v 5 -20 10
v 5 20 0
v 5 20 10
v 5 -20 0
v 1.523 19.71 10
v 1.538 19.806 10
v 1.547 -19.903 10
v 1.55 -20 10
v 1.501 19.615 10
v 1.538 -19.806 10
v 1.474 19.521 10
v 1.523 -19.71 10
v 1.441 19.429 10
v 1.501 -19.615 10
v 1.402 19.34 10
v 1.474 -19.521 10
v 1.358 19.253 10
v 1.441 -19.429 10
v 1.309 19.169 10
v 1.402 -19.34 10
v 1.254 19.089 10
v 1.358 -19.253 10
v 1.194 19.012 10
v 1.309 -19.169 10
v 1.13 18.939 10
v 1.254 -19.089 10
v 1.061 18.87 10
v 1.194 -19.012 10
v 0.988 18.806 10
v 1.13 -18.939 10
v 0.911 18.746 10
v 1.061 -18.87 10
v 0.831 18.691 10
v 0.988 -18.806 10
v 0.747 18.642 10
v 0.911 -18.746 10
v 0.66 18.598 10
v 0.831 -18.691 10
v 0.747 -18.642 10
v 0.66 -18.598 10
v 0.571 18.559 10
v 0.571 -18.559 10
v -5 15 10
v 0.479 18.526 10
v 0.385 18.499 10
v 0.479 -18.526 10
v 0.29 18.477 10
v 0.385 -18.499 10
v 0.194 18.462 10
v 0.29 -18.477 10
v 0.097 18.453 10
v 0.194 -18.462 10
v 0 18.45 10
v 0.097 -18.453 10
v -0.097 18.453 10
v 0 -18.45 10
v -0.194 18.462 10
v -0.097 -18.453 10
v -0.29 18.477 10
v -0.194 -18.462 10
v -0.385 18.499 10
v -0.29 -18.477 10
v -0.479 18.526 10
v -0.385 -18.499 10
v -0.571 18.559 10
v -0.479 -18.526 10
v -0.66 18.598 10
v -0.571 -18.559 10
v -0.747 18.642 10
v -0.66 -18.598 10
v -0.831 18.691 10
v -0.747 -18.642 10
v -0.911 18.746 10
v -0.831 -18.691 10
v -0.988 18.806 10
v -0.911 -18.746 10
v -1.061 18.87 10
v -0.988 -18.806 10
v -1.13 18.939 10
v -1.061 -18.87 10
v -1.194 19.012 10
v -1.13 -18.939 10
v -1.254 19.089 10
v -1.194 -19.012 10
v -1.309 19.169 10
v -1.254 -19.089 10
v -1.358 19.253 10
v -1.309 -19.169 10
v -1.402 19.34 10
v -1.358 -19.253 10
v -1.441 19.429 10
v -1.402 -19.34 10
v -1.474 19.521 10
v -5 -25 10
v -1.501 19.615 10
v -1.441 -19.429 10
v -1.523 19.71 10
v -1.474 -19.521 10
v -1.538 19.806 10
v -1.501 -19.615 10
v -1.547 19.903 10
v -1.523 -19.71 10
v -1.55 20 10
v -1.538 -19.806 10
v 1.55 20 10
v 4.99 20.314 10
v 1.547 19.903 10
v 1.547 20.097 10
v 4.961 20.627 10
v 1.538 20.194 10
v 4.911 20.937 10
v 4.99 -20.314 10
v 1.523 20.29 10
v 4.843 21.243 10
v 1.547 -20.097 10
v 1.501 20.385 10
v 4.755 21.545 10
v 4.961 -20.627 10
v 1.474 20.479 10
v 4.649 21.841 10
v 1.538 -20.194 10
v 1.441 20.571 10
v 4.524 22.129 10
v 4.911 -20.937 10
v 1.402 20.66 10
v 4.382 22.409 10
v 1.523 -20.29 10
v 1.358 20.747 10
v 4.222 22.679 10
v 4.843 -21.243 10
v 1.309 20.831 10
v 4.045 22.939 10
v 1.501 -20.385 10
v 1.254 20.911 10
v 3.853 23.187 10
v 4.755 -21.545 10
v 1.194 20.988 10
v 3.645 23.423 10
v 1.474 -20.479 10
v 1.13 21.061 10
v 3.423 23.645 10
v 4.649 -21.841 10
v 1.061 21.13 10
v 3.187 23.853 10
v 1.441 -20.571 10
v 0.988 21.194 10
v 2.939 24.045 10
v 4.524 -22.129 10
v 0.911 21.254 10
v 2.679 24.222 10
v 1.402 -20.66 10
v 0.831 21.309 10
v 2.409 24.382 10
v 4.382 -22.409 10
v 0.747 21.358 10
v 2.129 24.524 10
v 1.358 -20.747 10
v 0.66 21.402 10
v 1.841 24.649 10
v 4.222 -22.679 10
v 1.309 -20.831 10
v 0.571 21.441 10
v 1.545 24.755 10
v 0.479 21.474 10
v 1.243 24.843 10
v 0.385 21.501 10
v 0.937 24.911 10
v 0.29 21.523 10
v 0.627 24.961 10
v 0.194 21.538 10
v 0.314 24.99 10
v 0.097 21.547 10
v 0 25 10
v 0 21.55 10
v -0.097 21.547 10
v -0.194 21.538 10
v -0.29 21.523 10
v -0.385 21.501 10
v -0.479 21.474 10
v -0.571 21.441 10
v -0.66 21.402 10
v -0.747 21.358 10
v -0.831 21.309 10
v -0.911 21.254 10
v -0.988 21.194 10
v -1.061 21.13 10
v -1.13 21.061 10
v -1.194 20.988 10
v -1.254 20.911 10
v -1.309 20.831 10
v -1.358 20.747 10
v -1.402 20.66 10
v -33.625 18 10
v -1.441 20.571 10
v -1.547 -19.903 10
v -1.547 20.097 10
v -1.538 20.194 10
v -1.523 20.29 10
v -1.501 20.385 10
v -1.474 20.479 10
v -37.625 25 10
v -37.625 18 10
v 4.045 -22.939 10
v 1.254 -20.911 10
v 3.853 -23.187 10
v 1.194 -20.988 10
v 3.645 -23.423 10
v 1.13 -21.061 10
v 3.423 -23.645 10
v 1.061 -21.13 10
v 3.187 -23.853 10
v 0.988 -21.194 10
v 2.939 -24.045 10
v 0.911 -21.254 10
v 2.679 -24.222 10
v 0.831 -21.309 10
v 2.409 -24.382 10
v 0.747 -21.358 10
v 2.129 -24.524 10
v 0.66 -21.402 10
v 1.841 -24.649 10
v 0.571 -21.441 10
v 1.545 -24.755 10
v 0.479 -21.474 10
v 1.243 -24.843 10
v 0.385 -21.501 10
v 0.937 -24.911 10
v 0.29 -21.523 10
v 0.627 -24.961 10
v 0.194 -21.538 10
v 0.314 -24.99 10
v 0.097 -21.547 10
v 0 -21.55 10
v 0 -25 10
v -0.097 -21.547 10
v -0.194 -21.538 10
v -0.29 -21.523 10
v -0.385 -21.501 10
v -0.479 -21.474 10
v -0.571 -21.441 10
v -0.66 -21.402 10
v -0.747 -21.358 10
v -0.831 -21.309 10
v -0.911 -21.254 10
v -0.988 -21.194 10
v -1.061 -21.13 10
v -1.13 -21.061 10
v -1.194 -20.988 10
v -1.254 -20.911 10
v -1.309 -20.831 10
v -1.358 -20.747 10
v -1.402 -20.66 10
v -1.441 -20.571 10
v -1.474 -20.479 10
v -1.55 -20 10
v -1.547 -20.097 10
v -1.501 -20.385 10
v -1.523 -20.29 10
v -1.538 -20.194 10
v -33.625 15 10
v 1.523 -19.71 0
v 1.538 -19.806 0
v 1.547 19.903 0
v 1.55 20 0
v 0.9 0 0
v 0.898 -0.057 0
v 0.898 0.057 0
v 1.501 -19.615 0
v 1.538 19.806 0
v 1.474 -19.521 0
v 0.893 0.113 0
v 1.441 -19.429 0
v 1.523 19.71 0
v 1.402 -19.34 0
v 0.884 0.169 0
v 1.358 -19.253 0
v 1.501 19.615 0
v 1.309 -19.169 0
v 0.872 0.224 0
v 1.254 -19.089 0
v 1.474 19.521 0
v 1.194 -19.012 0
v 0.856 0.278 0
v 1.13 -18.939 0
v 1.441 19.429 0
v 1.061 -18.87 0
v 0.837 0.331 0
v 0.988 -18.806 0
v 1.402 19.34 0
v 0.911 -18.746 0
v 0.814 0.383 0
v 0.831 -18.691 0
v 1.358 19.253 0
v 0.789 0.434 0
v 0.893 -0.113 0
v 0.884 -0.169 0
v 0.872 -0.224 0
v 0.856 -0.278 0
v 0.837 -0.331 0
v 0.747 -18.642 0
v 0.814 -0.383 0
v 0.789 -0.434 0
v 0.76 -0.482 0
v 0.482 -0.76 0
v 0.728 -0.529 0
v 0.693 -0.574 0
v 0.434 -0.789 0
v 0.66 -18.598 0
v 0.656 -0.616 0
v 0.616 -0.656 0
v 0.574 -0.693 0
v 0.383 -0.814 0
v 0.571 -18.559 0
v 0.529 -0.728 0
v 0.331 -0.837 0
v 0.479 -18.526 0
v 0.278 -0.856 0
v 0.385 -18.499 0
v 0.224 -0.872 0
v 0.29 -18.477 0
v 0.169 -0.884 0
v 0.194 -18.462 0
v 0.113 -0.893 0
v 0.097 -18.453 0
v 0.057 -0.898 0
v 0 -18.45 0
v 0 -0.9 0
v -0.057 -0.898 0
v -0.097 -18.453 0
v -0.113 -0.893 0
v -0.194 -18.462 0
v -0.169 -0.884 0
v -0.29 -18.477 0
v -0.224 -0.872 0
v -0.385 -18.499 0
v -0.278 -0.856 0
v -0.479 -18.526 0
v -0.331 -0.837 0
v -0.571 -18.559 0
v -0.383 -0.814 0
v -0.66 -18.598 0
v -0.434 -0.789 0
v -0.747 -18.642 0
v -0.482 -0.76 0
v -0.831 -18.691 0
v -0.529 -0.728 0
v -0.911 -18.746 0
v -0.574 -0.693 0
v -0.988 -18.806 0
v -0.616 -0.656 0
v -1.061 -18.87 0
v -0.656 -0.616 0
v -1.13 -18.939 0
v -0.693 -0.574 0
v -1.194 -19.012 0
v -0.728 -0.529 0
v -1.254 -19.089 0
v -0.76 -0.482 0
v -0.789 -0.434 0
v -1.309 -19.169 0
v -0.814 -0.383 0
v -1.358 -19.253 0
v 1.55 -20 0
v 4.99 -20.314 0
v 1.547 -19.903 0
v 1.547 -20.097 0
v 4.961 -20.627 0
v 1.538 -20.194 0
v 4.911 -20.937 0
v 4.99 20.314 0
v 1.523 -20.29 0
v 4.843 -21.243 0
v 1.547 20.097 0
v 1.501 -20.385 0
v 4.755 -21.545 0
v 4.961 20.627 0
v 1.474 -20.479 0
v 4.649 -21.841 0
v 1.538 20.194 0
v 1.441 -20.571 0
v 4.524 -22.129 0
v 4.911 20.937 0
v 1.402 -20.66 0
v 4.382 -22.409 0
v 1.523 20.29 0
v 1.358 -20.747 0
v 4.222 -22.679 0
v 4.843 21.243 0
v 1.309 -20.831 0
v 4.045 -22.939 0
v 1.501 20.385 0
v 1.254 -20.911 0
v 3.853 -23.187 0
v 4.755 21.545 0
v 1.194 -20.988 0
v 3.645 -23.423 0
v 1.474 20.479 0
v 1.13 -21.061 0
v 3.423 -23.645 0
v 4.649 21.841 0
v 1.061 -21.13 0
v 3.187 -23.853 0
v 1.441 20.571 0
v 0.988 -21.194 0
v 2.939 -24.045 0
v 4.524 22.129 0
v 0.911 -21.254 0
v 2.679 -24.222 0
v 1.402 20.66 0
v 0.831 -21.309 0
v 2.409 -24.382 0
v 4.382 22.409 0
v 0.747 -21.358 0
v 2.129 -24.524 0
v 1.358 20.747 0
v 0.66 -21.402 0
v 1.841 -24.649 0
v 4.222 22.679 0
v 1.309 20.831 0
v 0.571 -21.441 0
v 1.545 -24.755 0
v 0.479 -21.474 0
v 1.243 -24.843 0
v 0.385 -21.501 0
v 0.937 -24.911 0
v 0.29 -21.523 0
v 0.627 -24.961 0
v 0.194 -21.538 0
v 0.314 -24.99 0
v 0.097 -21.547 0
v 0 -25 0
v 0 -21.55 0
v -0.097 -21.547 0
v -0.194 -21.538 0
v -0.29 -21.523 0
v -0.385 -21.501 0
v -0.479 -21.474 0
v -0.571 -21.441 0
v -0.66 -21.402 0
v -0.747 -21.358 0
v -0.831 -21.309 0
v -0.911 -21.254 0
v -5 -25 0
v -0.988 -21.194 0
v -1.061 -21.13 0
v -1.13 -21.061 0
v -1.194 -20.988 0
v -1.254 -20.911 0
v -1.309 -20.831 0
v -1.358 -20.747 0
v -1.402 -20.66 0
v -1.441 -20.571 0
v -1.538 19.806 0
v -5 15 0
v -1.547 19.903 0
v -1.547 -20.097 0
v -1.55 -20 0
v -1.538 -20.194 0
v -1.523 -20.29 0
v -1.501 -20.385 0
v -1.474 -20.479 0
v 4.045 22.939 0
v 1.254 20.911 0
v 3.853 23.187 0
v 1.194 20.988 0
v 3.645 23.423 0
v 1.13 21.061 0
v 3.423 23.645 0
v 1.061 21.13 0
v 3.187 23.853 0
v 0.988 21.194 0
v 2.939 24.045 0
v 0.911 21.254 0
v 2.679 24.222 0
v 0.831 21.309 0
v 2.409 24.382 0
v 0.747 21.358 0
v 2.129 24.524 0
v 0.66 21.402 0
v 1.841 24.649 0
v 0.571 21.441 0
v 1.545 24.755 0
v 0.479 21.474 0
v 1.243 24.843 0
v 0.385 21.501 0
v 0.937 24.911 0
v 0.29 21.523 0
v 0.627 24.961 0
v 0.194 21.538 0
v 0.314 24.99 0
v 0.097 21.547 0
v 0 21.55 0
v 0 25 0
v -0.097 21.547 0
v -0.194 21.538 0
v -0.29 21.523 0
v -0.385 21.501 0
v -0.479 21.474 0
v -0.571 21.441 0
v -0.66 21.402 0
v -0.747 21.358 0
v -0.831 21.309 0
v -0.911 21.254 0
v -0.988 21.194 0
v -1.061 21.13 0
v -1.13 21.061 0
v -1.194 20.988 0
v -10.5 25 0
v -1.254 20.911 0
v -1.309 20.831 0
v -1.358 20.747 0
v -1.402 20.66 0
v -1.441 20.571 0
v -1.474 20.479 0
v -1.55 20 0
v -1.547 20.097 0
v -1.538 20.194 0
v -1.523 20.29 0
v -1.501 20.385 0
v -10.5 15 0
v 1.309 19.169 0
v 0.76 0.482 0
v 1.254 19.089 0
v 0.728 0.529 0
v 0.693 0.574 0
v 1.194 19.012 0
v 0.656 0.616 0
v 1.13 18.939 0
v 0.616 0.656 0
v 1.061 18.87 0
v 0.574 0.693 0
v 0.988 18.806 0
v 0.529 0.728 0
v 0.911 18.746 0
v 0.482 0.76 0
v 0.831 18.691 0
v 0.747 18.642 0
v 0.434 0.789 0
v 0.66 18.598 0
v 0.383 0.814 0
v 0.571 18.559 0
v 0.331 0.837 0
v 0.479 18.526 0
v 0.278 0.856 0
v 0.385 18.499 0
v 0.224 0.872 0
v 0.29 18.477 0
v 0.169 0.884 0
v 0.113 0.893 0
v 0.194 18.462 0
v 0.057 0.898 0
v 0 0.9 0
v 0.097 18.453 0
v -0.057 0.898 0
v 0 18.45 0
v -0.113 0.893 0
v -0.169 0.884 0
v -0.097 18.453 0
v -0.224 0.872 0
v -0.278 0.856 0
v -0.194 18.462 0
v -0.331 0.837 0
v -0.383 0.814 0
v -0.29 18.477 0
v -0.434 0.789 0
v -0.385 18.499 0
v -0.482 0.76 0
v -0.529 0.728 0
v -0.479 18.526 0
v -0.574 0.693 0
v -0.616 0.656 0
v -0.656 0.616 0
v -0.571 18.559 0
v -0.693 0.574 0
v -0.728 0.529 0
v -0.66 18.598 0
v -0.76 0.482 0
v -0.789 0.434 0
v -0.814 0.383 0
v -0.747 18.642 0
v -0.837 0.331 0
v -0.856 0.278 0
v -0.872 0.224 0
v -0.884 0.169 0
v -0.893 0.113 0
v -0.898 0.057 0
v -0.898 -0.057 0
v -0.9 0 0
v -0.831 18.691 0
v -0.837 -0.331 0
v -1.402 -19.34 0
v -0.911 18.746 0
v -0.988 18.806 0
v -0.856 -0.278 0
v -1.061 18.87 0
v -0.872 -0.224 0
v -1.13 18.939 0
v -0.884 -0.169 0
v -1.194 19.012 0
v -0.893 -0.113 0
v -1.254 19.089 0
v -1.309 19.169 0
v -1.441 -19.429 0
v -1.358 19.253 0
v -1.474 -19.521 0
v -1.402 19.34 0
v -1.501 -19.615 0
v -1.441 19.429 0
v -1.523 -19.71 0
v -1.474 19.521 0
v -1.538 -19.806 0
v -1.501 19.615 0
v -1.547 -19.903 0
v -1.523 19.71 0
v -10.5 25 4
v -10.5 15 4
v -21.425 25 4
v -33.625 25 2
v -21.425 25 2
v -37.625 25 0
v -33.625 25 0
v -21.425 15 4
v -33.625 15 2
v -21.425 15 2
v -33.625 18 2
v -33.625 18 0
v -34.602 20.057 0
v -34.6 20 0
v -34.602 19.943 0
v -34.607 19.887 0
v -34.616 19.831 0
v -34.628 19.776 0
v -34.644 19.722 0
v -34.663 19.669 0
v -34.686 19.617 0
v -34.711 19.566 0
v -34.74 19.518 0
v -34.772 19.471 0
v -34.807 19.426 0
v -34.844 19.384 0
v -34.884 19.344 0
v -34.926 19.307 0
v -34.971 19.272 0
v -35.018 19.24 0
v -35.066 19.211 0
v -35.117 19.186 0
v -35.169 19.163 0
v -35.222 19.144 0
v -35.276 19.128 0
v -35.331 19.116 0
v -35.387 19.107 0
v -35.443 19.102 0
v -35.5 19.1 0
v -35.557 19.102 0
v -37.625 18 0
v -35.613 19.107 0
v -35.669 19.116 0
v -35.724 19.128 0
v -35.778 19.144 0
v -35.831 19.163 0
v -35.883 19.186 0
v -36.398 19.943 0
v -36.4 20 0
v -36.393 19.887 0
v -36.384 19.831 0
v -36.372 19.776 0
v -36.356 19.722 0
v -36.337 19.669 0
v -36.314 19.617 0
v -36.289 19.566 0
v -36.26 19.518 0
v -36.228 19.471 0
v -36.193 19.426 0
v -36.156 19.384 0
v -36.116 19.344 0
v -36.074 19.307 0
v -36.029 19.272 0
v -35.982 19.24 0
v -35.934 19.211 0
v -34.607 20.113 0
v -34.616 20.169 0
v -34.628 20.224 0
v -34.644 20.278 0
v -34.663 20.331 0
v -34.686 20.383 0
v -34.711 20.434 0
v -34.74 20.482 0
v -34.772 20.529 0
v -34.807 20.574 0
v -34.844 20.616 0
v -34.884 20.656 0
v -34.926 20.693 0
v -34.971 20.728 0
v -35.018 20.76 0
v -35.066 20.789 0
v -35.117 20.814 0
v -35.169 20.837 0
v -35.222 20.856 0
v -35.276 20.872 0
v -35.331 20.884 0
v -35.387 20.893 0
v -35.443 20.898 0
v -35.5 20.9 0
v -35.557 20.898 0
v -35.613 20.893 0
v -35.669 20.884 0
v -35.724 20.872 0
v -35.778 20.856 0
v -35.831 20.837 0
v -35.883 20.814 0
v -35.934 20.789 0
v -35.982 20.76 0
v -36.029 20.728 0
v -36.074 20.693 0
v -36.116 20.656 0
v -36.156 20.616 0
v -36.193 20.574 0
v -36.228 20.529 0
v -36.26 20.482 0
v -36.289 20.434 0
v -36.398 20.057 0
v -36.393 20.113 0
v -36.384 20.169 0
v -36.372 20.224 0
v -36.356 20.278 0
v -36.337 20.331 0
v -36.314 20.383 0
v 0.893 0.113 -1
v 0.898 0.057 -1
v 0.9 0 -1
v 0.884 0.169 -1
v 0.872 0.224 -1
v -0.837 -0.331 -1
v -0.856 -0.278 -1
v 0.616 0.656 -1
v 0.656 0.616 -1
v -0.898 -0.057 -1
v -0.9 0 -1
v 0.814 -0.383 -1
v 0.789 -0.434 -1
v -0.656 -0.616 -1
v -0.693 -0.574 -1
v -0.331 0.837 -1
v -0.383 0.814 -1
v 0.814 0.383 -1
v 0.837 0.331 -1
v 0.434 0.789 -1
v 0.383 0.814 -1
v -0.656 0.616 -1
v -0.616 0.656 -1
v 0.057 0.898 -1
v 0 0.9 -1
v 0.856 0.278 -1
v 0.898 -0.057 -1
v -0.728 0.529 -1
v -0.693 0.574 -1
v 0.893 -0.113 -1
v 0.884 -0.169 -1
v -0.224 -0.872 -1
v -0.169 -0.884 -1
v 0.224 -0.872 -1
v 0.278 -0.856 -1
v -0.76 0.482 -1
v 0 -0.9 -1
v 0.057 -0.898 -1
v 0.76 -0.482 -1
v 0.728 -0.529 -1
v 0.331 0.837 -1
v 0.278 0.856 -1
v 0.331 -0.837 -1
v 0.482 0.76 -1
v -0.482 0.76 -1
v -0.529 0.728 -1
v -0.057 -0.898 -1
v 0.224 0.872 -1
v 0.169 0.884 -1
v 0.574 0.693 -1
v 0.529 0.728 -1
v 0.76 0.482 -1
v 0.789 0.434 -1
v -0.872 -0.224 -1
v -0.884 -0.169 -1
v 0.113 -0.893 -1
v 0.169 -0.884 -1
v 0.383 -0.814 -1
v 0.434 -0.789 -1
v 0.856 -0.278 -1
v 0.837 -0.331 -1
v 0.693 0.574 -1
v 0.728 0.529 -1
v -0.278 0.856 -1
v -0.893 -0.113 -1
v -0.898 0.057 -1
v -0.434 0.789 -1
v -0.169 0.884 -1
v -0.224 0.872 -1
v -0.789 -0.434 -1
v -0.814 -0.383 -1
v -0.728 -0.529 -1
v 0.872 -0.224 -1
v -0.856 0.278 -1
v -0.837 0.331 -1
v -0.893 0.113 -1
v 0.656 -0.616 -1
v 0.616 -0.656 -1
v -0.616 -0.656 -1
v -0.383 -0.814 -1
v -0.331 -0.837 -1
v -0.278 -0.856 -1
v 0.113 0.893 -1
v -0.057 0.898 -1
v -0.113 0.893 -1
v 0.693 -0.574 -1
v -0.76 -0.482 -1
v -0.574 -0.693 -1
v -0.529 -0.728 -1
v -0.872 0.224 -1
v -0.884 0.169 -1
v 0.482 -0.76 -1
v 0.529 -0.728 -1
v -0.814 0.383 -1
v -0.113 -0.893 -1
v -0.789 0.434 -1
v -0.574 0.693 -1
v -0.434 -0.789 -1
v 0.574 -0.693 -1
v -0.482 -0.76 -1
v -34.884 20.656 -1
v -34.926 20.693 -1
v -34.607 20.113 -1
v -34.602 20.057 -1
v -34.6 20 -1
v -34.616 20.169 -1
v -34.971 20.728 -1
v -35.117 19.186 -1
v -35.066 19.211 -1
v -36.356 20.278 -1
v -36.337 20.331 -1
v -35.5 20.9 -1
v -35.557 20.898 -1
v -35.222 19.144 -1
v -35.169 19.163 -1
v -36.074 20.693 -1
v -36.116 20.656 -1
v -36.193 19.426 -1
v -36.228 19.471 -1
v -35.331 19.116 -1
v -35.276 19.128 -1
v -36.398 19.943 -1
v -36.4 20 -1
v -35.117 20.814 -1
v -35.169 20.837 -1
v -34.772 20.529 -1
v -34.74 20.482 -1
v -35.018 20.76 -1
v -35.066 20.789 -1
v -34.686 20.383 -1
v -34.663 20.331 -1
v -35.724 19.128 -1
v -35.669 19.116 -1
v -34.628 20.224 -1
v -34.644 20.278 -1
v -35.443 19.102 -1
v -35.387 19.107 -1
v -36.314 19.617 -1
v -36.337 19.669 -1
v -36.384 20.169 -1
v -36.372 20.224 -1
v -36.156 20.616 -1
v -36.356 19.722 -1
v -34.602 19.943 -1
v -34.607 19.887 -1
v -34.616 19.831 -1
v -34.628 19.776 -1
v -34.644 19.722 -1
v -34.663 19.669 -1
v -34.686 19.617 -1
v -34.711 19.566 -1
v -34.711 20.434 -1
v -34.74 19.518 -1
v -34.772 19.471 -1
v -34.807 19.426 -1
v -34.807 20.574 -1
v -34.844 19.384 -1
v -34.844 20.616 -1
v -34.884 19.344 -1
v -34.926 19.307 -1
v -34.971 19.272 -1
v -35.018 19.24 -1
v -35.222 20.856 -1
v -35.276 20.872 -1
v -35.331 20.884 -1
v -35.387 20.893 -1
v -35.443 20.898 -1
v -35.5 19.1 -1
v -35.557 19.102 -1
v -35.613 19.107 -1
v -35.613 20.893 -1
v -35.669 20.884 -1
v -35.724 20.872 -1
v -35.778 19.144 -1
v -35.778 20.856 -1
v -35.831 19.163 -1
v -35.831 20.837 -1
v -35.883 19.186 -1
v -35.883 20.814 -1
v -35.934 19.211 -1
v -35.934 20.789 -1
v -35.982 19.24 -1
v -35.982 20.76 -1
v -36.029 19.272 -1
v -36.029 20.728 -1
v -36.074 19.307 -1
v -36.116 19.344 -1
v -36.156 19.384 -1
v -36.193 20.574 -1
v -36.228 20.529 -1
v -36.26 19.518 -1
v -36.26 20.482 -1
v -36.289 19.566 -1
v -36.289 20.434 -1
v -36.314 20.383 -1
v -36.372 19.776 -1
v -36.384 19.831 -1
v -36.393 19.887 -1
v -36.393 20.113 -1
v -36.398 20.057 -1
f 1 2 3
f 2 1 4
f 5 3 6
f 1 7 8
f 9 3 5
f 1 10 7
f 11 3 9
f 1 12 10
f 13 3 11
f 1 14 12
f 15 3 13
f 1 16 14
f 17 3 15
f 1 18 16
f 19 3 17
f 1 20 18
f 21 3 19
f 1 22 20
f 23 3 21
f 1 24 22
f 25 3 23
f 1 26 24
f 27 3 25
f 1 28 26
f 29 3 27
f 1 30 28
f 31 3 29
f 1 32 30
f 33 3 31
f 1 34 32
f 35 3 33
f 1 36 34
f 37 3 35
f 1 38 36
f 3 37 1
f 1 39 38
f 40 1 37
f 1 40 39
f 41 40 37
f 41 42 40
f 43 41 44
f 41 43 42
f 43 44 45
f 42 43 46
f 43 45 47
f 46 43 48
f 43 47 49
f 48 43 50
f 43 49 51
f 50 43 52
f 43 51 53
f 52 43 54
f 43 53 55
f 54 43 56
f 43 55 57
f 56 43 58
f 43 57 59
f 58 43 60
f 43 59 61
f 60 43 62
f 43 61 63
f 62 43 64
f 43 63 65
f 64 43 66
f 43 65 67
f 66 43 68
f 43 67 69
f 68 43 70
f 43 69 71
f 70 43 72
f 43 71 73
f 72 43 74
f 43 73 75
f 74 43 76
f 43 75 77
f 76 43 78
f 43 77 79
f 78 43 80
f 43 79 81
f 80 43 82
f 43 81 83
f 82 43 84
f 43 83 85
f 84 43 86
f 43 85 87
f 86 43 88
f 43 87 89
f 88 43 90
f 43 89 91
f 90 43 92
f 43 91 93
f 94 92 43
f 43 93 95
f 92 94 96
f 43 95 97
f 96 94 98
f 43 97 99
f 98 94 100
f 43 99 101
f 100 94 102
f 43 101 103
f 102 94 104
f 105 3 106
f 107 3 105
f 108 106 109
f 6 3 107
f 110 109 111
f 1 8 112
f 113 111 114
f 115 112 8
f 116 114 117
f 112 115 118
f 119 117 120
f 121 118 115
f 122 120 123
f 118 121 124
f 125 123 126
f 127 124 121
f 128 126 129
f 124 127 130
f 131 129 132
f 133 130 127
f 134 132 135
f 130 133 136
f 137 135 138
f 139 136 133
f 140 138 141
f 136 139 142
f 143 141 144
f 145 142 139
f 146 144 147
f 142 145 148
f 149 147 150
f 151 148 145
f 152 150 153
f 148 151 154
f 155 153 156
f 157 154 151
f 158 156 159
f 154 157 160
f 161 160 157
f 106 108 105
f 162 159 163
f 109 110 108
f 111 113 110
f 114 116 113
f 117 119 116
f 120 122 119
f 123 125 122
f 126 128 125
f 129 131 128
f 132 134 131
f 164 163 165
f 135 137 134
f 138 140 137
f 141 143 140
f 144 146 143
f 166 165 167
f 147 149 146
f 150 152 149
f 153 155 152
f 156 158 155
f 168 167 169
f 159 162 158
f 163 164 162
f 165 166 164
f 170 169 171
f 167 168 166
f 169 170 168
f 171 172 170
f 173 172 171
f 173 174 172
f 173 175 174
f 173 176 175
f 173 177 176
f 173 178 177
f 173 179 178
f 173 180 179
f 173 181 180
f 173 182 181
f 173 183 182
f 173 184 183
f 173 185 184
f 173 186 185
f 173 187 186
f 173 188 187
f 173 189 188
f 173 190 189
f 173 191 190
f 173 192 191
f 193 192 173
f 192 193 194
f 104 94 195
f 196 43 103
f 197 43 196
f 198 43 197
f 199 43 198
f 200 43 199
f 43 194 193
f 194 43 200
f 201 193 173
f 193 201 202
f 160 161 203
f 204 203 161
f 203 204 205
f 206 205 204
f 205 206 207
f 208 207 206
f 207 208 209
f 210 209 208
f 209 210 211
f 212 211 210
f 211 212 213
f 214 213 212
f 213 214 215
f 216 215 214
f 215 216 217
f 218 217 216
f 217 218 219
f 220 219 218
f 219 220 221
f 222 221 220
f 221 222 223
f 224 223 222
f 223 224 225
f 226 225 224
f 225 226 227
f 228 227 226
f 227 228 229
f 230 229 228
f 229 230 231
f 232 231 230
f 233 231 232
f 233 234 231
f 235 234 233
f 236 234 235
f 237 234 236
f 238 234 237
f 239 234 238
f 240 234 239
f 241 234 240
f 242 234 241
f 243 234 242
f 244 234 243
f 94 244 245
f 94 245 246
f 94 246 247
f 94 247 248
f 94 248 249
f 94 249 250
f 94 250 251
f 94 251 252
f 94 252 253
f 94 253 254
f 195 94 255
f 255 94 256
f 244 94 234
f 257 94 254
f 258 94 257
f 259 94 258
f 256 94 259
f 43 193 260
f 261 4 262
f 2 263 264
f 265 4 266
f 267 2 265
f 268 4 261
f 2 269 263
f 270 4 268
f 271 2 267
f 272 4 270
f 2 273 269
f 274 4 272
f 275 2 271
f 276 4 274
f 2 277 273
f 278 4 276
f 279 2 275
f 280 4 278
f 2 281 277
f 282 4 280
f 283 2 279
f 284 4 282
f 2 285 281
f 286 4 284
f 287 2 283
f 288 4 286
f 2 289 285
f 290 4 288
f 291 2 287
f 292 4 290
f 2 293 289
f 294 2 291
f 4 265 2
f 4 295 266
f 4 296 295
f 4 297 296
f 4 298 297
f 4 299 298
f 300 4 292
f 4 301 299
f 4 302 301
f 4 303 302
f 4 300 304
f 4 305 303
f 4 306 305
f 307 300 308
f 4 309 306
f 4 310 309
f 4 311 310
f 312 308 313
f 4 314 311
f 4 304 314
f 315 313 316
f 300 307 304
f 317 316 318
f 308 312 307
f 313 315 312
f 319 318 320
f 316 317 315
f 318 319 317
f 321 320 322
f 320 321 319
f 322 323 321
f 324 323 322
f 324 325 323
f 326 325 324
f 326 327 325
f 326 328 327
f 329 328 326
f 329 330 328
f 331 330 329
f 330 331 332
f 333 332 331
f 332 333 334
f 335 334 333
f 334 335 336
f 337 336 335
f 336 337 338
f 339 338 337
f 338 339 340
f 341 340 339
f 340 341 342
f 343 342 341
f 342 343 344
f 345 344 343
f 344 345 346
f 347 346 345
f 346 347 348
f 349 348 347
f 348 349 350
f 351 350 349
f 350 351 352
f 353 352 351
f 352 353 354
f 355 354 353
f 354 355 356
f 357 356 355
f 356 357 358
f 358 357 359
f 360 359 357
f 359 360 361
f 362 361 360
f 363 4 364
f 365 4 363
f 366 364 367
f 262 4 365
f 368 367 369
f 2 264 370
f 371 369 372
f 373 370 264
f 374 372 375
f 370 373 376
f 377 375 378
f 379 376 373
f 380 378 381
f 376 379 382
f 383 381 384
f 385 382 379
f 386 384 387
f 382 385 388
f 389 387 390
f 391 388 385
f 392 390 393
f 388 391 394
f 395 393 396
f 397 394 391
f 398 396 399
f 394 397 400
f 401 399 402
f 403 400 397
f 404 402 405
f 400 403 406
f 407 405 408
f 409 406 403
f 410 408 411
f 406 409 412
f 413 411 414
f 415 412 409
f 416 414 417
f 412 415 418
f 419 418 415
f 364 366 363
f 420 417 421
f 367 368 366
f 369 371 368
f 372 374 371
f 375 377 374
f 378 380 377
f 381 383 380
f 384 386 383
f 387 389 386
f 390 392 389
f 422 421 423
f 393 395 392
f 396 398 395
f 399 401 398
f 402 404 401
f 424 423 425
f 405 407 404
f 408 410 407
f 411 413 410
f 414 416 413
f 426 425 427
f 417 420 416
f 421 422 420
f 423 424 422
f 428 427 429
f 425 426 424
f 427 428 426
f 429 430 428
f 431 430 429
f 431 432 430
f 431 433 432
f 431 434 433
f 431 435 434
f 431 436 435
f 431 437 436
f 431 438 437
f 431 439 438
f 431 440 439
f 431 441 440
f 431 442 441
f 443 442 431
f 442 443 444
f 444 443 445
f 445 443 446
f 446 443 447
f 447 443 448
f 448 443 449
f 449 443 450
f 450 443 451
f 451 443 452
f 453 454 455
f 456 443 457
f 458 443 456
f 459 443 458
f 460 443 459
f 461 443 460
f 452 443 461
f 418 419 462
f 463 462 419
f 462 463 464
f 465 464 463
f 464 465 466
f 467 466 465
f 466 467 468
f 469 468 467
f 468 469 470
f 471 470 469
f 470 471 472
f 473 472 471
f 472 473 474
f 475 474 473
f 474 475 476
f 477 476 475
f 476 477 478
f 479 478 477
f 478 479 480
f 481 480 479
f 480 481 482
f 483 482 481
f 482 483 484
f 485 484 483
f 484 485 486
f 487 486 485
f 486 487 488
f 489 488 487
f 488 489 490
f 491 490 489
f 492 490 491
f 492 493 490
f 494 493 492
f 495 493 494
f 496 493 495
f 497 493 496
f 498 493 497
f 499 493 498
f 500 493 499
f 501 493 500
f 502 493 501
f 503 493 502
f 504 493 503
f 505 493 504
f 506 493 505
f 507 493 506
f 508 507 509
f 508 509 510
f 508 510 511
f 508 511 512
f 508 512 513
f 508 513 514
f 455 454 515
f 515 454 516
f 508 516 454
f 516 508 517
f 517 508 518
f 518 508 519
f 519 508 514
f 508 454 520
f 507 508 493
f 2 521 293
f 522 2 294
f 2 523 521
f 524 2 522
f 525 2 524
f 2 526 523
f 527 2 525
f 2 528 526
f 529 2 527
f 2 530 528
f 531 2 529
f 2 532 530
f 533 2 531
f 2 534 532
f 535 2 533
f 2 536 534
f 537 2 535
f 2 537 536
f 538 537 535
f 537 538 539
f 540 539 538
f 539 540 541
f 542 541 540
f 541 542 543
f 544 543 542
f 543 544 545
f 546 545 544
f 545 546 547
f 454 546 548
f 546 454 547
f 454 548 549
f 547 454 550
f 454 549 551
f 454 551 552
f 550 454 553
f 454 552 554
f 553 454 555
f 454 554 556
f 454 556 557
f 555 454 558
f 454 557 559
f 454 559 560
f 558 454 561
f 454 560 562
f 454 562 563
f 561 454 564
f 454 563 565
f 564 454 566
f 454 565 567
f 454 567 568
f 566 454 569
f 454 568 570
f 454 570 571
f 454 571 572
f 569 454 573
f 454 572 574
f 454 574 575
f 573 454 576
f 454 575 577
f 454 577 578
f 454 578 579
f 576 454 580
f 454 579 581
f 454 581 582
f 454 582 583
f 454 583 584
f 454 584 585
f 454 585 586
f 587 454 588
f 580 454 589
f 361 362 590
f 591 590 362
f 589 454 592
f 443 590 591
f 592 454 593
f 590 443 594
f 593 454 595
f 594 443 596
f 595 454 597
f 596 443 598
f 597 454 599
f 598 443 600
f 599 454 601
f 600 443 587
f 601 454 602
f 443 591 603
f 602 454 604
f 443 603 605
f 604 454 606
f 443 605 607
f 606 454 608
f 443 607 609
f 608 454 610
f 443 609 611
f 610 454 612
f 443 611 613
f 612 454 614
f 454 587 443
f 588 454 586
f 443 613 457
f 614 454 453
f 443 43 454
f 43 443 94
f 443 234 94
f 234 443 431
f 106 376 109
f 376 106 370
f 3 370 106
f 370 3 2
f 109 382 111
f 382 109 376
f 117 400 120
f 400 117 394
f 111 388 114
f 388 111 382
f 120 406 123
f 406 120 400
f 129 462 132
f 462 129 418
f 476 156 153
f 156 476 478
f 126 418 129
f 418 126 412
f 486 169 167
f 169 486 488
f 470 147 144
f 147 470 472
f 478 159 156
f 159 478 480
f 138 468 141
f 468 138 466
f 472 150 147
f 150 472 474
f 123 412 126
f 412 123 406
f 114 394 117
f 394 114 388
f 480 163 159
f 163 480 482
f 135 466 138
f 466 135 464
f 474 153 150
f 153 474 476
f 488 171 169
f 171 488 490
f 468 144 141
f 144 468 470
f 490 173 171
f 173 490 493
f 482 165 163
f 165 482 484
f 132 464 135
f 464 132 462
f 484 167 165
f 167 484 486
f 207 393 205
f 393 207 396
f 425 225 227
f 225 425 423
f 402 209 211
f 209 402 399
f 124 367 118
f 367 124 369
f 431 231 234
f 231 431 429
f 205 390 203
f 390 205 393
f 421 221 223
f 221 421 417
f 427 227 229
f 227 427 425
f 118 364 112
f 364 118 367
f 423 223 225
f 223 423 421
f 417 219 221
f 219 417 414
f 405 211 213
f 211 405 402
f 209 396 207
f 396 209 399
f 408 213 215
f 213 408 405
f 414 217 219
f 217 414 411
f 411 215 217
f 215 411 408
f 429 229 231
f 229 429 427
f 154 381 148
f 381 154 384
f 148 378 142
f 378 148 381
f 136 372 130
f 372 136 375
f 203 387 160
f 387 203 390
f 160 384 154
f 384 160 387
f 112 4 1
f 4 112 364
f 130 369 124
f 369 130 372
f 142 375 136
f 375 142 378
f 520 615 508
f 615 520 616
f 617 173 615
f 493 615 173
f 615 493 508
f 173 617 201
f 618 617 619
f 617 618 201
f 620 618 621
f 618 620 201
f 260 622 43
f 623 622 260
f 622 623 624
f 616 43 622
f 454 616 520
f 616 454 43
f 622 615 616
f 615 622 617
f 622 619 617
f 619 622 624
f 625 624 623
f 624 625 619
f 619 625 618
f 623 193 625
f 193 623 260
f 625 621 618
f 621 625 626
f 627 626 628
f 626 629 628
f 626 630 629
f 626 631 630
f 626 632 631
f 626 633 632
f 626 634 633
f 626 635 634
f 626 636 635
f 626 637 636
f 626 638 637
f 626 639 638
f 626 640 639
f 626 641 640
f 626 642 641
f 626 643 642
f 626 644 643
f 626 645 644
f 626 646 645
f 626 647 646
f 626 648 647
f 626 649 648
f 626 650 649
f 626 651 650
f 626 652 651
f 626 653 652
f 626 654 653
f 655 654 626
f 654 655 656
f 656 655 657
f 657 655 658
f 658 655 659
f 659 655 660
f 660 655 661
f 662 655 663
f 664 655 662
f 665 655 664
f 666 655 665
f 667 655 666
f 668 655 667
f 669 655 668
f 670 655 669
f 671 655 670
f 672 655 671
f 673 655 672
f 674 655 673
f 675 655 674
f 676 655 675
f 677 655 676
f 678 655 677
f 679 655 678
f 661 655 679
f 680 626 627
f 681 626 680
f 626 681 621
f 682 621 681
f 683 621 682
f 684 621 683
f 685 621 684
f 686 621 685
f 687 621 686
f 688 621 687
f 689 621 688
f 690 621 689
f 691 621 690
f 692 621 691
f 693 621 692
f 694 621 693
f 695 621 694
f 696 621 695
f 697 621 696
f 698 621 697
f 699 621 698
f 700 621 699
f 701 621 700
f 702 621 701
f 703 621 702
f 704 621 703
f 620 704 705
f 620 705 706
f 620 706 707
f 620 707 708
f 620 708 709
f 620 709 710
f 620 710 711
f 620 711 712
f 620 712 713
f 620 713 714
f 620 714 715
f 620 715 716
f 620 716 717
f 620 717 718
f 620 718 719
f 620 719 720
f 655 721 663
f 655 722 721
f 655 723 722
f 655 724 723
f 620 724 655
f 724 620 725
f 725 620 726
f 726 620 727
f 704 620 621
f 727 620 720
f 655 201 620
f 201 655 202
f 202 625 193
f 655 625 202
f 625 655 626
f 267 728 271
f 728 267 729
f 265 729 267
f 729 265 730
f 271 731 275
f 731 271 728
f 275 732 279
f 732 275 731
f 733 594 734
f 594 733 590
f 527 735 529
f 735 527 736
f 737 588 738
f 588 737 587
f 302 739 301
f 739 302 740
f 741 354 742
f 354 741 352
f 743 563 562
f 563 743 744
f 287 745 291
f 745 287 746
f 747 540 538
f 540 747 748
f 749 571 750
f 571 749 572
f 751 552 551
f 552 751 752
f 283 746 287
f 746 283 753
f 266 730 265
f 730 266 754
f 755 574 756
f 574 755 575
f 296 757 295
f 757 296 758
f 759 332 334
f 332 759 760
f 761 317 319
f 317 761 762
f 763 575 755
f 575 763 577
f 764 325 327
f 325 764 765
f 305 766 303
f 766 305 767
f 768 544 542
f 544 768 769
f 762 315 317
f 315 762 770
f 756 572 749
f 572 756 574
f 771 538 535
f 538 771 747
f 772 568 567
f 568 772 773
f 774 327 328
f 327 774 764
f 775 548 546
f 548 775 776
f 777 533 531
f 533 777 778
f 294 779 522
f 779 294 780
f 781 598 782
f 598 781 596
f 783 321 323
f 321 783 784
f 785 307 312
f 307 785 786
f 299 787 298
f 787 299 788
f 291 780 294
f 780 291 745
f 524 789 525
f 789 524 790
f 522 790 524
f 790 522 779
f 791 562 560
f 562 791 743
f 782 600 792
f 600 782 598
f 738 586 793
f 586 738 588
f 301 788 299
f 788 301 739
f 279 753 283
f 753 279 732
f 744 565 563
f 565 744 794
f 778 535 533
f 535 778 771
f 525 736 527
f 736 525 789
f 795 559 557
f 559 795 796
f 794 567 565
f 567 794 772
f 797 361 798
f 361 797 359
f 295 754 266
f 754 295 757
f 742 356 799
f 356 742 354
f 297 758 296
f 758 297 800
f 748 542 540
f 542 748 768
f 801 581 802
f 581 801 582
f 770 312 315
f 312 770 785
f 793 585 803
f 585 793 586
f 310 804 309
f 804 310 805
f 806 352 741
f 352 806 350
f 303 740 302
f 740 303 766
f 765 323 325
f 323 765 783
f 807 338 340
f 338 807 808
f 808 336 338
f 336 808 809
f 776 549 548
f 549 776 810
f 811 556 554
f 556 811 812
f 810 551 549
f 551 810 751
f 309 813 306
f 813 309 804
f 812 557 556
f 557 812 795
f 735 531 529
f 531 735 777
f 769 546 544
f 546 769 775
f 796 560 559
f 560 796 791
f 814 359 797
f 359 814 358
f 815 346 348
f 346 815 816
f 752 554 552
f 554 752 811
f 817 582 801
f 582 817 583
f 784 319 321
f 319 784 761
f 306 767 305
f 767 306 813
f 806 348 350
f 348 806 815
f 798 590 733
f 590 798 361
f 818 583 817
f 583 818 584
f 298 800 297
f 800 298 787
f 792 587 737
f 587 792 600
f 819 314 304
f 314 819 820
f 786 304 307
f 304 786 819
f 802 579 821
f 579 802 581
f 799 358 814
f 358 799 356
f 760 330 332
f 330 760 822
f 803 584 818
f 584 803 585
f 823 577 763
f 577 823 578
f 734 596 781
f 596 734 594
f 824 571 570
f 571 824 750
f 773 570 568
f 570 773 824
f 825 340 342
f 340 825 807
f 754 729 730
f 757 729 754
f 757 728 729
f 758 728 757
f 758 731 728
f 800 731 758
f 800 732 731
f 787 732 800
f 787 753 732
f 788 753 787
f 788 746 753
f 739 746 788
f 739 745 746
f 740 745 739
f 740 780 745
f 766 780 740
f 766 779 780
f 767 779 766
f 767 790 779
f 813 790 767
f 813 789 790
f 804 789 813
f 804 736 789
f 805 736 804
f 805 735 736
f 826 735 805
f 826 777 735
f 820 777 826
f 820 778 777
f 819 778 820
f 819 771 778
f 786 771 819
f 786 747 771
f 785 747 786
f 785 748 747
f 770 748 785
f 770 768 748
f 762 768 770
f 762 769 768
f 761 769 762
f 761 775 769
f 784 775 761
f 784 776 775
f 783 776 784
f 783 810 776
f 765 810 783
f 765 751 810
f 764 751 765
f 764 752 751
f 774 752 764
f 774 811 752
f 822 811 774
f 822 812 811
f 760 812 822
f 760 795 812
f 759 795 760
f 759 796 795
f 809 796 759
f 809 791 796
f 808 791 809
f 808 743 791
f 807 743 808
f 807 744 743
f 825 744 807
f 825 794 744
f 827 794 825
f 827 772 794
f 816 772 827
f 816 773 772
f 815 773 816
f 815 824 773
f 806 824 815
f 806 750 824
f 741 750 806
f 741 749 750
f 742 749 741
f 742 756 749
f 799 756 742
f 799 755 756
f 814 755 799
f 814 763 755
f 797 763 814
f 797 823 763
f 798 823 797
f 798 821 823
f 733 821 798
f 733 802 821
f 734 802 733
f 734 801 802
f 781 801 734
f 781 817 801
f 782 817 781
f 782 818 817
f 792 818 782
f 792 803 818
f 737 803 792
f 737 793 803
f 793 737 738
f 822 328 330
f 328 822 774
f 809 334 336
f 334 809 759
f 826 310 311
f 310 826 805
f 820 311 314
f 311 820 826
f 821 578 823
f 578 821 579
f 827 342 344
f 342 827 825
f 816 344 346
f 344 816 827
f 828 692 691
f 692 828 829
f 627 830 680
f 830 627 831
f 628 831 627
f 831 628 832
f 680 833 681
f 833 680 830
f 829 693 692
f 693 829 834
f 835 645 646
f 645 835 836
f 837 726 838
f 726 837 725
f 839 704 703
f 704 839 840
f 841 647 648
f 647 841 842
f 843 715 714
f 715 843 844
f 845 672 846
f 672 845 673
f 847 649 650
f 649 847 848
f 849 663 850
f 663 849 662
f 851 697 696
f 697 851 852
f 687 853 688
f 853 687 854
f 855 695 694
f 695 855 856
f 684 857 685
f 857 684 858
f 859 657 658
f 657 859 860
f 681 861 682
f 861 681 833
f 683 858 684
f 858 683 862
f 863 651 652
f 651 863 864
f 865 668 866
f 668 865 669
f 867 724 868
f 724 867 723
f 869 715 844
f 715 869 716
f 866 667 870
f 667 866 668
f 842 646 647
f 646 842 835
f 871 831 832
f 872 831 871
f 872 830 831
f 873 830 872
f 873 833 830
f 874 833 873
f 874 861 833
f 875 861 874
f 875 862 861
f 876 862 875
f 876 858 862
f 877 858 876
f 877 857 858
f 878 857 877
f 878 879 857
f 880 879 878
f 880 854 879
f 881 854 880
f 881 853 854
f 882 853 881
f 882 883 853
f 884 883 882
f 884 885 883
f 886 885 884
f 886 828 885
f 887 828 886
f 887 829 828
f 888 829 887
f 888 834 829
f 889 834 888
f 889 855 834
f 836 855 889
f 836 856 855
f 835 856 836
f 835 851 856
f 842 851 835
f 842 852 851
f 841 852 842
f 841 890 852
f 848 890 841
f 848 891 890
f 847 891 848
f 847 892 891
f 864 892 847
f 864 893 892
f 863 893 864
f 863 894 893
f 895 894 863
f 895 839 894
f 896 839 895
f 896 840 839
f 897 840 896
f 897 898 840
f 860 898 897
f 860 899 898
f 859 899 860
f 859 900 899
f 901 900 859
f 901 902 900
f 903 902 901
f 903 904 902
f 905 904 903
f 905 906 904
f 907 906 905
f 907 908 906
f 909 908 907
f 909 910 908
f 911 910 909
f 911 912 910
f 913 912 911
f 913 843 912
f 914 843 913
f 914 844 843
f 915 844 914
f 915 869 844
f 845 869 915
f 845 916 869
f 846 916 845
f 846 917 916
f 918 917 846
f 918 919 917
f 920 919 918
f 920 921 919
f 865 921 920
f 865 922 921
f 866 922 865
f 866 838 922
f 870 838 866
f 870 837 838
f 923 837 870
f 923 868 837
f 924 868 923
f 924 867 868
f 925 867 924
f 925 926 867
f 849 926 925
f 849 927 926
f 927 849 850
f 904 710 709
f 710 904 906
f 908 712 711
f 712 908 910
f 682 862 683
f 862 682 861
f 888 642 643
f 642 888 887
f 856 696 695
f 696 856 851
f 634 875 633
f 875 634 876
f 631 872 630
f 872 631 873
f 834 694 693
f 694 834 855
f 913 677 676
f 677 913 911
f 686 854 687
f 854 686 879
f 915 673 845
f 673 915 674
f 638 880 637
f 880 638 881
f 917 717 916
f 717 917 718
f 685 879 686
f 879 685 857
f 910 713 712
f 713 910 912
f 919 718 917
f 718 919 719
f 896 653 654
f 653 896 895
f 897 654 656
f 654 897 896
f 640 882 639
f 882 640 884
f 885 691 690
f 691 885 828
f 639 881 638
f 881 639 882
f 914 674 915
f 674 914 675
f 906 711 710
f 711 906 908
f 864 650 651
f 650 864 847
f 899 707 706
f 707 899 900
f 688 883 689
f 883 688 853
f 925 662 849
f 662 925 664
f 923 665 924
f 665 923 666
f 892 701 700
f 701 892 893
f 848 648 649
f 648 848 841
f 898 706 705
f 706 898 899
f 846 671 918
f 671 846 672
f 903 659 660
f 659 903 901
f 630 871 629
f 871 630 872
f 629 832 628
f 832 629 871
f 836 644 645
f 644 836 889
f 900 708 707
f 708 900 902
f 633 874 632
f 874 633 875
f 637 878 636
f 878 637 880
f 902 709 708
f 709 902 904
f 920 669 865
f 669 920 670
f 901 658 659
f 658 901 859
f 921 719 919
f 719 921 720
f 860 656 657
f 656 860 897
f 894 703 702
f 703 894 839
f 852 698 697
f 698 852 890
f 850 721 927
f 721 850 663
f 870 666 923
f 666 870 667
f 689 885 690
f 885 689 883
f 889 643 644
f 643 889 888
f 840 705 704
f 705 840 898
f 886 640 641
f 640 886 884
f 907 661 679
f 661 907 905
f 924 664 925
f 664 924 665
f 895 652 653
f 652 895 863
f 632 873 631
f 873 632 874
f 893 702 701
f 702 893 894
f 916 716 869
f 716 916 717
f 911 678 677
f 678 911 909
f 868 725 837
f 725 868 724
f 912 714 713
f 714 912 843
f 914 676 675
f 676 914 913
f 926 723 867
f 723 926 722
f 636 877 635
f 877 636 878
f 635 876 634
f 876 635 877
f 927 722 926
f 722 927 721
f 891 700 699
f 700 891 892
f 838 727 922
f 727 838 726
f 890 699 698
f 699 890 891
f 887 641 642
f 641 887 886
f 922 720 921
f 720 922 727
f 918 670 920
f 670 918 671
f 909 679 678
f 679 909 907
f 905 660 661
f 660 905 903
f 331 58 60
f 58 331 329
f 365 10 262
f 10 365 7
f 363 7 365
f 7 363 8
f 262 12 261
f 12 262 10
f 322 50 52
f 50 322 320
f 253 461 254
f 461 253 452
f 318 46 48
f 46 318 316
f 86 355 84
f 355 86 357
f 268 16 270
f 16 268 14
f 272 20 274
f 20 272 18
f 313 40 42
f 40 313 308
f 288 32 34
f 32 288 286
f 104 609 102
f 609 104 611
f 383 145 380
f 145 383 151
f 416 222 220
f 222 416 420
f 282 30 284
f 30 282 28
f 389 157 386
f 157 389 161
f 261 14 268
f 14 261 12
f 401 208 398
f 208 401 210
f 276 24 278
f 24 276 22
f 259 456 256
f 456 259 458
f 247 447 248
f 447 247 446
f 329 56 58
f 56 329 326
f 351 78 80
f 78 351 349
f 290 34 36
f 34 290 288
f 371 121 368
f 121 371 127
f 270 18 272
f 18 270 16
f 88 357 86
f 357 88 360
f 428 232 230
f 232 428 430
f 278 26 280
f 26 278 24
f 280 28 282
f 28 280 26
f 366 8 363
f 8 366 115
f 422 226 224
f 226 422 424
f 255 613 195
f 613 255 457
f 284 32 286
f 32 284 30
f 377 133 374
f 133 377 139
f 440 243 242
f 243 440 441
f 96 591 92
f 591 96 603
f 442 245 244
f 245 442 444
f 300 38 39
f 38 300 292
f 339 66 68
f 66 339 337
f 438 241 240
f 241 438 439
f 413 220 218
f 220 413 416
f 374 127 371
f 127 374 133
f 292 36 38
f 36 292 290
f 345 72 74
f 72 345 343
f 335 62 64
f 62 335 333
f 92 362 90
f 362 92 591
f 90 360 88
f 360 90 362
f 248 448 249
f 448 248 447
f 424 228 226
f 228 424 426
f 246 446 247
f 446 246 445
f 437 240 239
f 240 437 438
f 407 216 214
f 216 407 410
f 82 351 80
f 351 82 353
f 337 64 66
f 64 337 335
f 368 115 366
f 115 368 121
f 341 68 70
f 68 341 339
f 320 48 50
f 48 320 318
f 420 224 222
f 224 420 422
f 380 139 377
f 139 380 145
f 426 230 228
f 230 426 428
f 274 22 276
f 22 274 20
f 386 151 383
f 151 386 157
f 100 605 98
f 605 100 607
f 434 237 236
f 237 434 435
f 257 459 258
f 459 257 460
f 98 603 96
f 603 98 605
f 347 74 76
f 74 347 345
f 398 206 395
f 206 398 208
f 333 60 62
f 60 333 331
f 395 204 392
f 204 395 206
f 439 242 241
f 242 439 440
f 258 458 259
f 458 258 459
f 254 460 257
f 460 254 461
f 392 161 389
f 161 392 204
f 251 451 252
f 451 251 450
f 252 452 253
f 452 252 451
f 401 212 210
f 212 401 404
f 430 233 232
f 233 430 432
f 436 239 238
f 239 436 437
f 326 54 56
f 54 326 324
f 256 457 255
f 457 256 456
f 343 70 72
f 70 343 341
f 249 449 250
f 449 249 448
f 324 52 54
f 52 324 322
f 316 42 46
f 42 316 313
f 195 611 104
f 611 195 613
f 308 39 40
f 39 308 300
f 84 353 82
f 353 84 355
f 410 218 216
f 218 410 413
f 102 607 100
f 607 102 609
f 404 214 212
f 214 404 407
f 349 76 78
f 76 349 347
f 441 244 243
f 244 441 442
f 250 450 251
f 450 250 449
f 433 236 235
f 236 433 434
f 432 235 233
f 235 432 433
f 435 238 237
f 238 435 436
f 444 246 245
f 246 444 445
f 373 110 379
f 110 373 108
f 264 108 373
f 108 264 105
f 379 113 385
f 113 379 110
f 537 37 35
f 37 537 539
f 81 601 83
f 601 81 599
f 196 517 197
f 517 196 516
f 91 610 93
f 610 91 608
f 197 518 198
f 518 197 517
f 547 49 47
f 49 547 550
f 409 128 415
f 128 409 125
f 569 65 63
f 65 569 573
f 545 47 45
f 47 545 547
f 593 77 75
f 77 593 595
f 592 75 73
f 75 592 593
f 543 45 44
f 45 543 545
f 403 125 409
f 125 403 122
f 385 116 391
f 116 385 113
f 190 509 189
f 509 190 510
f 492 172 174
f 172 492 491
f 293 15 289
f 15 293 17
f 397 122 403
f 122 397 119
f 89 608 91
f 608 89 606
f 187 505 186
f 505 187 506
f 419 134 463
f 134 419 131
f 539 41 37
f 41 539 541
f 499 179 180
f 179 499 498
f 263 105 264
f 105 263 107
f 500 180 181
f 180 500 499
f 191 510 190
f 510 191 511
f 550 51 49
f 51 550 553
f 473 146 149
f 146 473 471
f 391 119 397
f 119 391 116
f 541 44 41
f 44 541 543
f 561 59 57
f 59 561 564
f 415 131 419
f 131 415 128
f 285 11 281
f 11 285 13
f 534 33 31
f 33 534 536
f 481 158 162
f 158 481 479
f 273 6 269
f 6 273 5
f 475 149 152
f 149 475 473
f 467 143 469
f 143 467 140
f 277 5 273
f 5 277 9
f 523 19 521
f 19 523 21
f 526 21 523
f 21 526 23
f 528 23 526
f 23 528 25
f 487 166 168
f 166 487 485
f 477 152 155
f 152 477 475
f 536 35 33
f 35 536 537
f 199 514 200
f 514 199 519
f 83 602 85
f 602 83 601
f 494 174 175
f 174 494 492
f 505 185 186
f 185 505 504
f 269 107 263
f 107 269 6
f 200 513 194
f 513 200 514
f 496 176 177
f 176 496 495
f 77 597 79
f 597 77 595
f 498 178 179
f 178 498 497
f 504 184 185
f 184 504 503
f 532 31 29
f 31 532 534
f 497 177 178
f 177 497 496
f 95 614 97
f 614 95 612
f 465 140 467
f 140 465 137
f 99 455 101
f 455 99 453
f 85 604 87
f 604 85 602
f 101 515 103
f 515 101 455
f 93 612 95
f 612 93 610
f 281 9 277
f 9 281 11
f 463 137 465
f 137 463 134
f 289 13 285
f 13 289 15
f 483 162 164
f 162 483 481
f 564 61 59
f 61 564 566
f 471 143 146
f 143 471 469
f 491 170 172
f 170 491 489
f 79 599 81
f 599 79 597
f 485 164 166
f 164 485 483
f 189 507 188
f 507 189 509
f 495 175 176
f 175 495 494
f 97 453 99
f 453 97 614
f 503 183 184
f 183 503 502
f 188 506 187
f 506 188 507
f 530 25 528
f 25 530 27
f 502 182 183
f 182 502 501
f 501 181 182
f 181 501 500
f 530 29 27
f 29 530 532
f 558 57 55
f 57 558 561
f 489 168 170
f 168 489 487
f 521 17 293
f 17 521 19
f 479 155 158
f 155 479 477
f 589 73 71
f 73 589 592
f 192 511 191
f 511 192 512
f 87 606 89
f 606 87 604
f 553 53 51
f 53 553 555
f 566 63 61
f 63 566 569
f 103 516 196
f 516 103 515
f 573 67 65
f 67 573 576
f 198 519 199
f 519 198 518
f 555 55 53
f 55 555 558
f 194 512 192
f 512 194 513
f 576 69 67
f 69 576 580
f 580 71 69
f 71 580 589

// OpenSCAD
$fn = 100;

right();
//left();

module left(z=10){
    difference(){
        union(){
            translate([0,0,z/2])cube([10,40,z],center=true);
            translate([0,20,0])cylinder(r=5,h=z);
            translate([0,-20,0])cylinder(r=5,h=z);
            translate([16.25/2,20,z/2])cube([16.25,10,z],center=true);
            translate([2.5,-20-2.5,z/2])cube([5,5,z],center=true);
            
            translate([0,0,-1])cylinder(r=.9,h=1);
            translate([12.5,20,-1])cylinder(r=.9,h=1);
        } union(){
            translate([0,-20,-0.1])cylinder(d=3.1,h=z+0.2);
            translate([0,20,-0.1])cylinder(d=3.1,h=z+0.2);
        }
    }
}

module right(z=10){
    difference(){
        union(){
            translate([0,0,z/2])cube([10,40,z],center=true);
            translate([-2.5,-20-2.5,z/2])cube([5,5,z],center=true);
            translate([0,20,0])cylinder(r=5,h=z);
            translate([0,-20,0])cylinder(r=5,h=z);
            translate([-10.5/2,20,z/2])cube([10.5,10,z],center=true);
            translate([-10.925/2-10.5,20,z-(z-4)/2])cube([10.925,10,z-4],center=true);
            translate([-12.2/2-10.5-10.925,20,z-(z-2)/2])cube([12.2,10,z-2],center=true);
            translate([-4/2-10.5-10.925-12.2,20+1.5,z/2])cube([4,7,z],center=true);
            
            
            translate([0,0,-1])cylinder(r=.9,h=1);
            translate([-35.5,20,-1])cylinder(r=.9,h=1);
        } union(){
            translate([0,-20,-0.1])cylinder(d=3.1,h=z+0.2);
            translate([0,20,-0.1])cylinder(d=3.1,h=z+0.2);
        }
    }
}

module right_simple(z=8){
    difference(){
        union(){
            translate([0,0,z/2])cube([10,40,z],center=true);
            translate([0,20,0])cylinder(r=5,h=z);
            translate([0,-20,0])cylinder(r=5,h=z);
            translate([-10.5/2,20,z/2])cube([10.5,10,z],center=true);
            //translate([2.5,-20-2.5,z/2])cube([5,5,z],center=true);
            
            translate([0,0,-1])cylinder(r=.9,h=1);
            //translate([12.5,20,-1])cylinder(r=.9,h=1);
        } union(){
            translate([0,-20,-0.1])cylinder(d=3.1,h=z+0.2);
            translate([0,20,-0.1])cylinder(d=3.1,h=z+0.2);
        }
    }
}
